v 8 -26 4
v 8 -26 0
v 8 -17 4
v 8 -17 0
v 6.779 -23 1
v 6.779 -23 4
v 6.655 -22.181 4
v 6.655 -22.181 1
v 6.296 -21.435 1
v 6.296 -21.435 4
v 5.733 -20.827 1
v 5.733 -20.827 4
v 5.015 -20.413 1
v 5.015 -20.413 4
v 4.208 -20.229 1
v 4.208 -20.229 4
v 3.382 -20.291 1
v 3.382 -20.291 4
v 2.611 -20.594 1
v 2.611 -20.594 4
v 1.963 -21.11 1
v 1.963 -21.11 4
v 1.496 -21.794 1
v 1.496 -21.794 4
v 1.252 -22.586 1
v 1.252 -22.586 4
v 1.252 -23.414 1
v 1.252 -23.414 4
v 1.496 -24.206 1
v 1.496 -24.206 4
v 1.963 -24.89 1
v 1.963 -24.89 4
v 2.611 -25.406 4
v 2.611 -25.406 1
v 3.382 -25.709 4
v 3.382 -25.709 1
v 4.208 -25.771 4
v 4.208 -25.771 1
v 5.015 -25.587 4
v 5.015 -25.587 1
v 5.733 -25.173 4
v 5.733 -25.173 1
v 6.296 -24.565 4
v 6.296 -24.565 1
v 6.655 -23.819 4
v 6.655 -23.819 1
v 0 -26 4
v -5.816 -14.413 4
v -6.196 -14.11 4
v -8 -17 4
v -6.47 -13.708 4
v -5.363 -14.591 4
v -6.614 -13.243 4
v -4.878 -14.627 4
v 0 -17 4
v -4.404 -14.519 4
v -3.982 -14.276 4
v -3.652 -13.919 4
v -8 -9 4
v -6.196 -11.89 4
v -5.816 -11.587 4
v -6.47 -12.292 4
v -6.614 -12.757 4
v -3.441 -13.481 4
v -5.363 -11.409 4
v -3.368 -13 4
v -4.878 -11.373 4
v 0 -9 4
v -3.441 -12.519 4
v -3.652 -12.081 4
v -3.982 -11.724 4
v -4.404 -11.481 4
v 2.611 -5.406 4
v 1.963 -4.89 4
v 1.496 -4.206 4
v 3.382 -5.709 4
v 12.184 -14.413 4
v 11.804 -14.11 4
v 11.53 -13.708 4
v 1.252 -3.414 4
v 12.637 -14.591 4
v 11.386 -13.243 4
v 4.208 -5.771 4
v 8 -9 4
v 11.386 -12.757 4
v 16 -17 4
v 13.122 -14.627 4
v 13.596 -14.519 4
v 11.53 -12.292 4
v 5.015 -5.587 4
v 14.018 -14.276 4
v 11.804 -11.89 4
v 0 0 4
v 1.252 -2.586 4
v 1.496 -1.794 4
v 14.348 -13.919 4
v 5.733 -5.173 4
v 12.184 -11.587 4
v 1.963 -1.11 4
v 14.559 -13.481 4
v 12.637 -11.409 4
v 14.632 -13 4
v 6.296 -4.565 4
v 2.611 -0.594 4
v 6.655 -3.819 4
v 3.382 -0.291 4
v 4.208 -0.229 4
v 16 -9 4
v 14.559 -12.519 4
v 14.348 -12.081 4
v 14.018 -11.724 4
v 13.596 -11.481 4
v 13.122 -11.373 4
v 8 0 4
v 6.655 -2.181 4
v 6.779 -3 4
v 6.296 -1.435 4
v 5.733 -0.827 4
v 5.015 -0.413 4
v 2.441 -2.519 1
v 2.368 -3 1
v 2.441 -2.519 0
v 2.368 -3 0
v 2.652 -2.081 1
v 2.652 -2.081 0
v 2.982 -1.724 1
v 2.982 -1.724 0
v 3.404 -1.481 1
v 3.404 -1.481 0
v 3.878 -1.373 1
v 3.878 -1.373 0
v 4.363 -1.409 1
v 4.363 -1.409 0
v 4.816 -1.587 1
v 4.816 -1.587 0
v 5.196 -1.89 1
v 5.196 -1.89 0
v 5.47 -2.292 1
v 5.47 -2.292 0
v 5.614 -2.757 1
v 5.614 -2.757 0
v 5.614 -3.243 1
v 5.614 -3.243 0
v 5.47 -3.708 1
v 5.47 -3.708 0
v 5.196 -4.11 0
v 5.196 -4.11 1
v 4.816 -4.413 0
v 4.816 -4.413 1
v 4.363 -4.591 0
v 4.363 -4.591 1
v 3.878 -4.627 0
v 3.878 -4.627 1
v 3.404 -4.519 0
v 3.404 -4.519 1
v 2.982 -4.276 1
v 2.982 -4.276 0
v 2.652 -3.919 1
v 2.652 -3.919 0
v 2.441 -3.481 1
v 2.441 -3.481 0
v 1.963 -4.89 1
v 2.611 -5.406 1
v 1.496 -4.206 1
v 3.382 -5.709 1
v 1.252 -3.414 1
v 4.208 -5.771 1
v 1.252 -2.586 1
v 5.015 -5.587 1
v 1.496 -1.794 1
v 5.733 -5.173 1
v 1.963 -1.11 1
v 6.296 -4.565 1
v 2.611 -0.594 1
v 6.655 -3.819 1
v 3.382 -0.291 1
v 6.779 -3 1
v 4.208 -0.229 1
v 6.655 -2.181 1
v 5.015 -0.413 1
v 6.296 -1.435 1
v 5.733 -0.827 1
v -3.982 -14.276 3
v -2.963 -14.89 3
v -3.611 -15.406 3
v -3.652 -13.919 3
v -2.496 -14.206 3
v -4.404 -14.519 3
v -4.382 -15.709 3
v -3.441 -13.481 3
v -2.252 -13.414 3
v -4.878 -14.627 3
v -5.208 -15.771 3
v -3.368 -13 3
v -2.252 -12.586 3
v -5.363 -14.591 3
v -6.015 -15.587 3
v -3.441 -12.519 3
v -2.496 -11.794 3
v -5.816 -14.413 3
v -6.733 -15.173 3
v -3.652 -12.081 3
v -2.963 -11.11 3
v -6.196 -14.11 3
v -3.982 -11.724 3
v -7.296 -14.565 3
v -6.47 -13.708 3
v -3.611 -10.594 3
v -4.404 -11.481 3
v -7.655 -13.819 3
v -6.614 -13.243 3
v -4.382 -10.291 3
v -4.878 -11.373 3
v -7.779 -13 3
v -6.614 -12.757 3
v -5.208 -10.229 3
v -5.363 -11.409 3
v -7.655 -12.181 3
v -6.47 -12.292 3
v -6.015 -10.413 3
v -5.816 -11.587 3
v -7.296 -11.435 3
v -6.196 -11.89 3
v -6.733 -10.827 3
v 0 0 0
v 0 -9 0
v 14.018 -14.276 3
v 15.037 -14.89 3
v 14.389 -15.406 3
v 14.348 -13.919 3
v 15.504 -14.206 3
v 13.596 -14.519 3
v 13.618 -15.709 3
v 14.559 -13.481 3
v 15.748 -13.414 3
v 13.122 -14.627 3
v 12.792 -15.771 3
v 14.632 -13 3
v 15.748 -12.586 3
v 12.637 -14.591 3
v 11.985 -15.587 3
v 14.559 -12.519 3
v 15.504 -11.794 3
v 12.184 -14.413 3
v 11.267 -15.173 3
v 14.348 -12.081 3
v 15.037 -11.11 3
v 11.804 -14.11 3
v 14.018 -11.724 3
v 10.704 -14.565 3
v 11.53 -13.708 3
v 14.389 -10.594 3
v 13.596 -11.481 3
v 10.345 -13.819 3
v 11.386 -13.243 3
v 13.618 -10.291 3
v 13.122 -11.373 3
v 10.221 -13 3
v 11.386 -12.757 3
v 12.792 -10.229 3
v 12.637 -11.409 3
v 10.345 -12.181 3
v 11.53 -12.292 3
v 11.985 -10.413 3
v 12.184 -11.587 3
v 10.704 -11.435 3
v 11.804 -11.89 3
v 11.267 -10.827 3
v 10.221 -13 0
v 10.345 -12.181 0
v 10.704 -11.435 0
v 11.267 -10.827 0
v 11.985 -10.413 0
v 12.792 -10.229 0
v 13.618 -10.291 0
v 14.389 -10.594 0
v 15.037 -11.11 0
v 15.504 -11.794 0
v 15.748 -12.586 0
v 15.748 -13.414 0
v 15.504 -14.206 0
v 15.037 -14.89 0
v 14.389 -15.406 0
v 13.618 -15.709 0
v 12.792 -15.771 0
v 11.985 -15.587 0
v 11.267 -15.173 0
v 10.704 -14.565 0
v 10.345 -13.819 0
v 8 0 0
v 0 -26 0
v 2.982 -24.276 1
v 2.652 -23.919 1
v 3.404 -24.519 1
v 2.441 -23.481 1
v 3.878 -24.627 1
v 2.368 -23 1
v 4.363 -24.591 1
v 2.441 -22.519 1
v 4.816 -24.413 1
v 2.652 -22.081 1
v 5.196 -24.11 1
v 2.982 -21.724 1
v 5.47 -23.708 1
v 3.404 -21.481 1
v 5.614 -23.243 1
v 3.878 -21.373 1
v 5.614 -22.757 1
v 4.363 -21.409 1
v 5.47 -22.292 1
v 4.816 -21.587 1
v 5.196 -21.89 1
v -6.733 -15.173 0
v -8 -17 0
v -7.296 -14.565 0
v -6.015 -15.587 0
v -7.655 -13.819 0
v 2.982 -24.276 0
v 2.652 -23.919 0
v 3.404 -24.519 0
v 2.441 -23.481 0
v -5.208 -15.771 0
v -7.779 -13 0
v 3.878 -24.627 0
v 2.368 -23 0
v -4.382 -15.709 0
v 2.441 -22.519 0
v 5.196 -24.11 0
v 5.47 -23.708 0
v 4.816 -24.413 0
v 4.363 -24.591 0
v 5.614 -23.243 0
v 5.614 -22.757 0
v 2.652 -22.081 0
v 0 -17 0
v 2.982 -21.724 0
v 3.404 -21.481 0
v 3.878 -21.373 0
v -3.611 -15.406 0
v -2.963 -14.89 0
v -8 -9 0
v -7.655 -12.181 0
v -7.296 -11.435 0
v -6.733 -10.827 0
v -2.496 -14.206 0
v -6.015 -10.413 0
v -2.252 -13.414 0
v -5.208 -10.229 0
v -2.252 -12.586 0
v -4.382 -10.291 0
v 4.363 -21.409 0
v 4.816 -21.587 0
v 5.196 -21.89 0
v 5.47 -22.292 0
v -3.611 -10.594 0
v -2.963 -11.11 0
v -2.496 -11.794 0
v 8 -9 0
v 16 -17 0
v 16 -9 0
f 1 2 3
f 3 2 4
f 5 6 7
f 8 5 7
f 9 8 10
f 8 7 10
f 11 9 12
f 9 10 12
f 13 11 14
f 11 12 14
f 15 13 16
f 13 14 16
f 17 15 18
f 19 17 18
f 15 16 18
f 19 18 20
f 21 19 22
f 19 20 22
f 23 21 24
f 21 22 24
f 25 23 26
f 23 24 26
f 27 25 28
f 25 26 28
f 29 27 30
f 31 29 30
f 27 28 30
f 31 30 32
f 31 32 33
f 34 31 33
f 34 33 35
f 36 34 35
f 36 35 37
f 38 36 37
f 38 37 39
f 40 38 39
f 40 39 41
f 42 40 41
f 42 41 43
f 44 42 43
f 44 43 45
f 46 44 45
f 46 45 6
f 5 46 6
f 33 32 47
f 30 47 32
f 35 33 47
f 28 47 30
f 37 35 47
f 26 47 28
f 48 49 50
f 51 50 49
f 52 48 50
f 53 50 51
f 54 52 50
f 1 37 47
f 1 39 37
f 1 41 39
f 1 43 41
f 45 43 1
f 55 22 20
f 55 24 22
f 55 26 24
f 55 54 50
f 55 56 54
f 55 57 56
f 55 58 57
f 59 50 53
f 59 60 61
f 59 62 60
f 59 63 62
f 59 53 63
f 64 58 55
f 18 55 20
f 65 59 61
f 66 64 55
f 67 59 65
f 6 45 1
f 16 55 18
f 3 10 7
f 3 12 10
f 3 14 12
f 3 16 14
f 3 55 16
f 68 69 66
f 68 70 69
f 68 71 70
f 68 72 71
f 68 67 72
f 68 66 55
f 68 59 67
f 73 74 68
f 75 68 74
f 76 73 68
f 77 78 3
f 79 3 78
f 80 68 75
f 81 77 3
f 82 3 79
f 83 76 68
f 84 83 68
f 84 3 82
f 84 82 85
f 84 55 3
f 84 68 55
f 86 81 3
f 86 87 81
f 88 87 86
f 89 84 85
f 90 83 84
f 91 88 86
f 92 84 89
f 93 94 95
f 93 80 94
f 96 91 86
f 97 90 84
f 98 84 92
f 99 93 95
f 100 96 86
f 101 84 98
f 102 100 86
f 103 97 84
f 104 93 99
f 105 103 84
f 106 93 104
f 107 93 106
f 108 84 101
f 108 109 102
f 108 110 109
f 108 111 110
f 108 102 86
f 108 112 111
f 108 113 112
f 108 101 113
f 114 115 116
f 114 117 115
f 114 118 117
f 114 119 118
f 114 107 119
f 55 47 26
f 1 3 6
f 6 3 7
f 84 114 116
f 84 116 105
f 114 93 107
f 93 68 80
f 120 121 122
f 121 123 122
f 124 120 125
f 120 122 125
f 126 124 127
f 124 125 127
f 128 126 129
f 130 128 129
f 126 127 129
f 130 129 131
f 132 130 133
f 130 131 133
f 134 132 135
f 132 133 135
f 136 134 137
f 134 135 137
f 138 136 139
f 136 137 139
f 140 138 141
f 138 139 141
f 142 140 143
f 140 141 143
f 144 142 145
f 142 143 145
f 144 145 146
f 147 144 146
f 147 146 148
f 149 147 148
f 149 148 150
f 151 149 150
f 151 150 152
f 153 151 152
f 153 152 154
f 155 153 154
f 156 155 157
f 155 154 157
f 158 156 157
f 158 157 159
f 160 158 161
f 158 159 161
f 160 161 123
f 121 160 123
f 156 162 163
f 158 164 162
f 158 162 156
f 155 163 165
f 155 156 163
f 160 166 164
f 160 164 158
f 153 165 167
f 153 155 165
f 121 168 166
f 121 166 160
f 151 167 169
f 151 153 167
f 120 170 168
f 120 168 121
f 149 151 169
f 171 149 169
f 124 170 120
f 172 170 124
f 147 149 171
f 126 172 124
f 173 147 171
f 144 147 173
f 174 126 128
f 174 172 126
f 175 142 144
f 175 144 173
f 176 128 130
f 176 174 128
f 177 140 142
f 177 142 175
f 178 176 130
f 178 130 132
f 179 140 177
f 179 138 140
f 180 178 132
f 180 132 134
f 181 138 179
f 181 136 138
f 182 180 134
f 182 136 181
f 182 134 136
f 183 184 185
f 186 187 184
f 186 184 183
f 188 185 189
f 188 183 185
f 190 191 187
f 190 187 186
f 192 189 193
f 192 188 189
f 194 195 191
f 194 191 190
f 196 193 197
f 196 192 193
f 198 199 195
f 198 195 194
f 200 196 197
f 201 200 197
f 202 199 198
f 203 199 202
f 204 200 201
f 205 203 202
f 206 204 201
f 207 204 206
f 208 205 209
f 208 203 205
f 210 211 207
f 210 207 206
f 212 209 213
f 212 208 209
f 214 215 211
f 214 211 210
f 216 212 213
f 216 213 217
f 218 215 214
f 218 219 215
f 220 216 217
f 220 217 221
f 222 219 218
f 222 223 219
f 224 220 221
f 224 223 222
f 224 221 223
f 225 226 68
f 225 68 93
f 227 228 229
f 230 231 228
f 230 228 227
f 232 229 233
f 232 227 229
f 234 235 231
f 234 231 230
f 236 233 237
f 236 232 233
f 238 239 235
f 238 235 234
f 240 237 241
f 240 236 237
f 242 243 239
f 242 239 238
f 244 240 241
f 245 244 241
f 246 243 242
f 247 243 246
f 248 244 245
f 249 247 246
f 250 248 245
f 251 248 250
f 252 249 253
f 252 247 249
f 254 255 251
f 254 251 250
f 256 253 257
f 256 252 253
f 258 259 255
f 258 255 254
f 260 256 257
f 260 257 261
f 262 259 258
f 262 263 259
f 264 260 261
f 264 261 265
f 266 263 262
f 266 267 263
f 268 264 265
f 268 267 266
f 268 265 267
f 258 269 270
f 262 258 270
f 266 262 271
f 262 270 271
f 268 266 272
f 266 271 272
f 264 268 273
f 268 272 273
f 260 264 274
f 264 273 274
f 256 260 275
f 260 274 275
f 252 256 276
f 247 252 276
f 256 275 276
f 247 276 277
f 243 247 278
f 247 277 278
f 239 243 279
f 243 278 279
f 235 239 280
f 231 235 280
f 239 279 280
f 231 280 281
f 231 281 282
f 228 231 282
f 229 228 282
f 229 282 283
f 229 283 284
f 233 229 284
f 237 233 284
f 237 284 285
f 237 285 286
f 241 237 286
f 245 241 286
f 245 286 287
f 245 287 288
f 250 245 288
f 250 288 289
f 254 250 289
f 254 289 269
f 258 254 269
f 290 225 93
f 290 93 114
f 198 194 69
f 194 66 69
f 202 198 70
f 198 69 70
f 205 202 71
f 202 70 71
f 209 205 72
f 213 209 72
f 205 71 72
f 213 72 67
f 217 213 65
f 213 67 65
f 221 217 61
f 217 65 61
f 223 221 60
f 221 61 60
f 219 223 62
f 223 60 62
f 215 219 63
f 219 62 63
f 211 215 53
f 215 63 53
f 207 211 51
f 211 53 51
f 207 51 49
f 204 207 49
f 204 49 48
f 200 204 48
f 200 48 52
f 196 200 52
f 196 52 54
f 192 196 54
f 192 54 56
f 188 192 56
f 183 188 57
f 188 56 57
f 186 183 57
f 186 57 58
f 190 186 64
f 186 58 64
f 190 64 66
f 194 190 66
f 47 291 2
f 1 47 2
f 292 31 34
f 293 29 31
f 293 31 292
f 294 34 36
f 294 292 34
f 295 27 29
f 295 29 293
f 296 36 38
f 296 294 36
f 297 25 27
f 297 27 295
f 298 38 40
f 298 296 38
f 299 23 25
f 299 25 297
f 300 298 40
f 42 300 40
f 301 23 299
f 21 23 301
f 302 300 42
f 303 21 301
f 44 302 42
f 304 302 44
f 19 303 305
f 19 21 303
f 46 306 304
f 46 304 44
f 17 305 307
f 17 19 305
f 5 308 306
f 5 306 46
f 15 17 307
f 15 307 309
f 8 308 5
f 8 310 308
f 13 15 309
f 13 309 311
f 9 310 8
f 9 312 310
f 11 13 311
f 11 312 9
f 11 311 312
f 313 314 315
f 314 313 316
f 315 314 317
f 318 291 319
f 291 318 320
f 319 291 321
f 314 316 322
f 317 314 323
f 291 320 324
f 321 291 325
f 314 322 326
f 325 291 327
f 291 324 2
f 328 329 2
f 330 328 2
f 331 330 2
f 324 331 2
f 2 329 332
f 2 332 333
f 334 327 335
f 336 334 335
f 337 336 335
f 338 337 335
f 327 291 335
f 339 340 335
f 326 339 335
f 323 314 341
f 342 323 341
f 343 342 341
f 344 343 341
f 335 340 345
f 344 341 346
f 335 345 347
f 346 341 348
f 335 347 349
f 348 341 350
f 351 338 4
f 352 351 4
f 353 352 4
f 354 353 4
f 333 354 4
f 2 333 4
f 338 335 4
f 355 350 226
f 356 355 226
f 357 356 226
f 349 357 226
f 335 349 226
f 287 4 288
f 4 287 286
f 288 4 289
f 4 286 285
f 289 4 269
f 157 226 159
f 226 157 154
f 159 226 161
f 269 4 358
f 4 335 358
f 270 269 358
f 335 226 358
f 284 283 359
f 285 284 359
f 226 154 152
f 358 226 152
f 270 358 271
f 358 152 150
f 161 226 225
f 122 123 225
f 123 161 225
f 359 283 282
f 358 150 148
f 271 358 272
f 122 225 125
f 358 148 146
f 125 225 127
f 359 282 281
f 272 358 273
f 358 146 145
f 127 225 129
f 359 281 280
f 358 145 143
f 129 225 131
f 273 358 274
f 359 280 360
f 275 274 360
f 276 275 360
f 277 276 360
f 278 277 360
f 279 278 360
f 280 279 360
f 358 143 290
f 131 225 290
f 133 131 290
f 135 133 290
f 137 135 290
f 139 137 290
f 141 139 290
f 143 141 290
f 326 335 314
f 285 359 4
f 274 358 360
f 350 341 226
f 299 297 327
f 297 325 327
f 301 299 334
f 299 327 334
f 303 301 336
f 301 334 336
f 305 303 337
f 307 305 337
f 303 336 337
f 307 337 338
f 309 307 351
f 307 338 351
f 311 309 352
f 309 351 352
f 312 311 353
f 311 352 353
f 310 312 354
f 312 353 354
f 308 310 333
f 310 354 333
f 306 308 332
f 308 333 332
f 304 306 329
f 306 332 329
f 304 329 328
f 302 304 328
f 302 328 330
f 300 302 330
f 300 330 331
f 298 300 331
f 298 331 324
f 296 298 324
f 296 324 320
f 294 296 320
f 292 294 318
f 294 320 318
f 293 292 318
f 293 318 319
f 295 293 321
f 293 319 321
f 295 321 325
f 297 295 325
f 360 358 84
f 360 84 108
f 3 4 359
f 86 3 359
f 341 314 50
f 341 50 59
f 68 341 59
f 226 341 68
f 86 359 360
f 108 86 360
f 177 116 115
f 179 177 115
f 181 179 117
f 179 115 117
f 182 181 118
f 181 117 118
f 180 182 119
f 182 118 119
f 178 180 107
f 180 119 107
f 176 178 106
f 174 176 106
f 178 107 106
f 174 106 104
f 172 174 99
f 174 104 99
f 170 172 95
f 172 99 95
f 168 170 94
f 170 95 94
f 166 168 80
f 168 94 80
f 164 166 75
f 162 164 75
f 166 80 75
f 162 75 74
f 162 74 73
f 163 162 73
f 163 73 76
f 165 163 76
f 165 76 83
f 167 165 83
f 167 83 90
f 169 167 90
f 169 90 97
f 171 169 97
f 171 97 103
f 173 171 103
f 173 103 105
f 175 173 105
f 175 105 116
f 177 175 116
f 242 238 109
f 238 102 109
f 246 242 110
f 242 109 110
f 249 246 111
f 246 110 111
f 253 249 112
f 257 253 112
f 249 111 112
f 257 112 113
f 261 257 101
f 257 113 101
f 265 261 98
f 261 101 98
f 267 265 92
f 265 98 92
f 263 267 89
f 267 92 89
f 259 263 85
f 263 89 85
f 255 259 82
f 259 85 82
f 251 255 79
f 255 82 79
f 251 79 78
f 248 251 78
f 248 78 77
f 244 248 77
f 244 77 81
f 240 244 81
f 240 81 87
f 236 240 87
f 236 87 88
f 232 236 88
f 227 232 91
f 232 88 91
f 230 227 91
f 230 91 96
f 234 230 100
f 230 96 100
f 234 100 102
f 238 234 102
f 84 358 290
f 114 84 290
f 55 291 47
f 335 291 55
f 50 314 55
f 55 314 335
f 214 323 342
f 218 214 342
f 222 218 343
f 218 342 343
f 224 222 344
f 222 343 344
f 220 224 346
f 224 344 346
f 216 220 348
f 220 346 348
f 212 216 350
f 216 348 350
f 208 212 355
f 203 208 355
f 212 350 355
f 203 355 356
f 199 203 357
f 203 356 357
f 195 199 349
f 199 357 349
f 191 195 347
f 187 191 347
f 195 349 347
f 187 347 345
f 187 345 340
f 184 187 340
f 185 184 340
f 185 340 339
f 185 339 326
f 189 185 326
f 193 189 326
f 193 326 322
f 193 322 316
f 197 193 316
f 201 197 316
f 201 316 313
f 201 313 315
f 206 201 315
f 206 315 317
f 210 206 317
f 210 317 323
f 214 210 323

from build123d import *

# Parameters (mm, degrees)
SKETCH3_W                                      = 8
SKETCH3_H                                      = 26
SKETCH3_R                                      = 1
SKETCH3_W_2                                    = 24
SKETCH3_H_2                                    = 8
BOSS_EXTRUDE1_DEPTH                            = 4
CBORE_FOR_4_SOCKET_HEAD_CAP_SCREW2_D           = 3.2639
CBORE_FOR_4_SOCKET_HEAD_CAP_SCREW2_CBORE_D     = 5.55752
CBORE_FOR_4_SOCKET_HEAD_CAP_SCREW2_CBORE_DEPTH = 3.000000096
CBORE_FOR_4_SOCKET_HEAD_CAP_SCREW3_D           = 3.2639
CBORE_FOR_4_SOCKET_HEAD_CAP_SCREW3_CBORE_D     = 5.55752
CBORE_FOR_4_SOCKET_HEAD_CAP_SCREW3_CBORE_DEPTH = 3.000000096


with BuildPart() as part:
    # Sketch3 → Boss-Extrude1 (new body)
    # profile 1 of 2: a face of its own
    with BuildSketch(Plane.XY):
        with Locations((4, -13)):
            Rectangle(SKETCH3_W, SKETCH3_H)
        with Locations((4, -3)):
            Circle(SKETCH3_R, mode=Mode.SUBTRACT)
        with Locations((4, -23)):
            Circle(SKETCH3_R, mode=Mode.SUBTRACT)
    # profile 2 of 2: a face of its own
    with BuildSketch(Plane.XY):
        with Locations((4, -13)):
            Rectangle(SKETCH3_W_2, SKETCH3_H_2)
        with Locations((-5, -13)):
            Circle(SKETCH3_R, mode=Mode.SUBTRACT)
        with Locations((13, -13)):
            Circle(SKETCH3_R, mode=Mode.SUBTRACT)
    extrude(amount=BOSS_EXTRUDE1_DEPTH)

    # CBORE for #4 Socket Head Cap Screw2 (through all)
    with Locations(Plane(origin=(4, -3, 4), x_dir=(1, 0, 0), z_dir=(0, 0, 1))):
        with Locations((0, 0), (0, -20)):
            CounterBoreHole(CBORE_FOR_4_SOCKET_HEAD_CAP_SCREW2_D / 2, CBORE_FOR_4_SOCKET_HEAD_CAP_SCREW2_CBORE_D / 2, CBORE_FOR_4_SOCKET_HEAD_CAP_SCREW2_CBORE_DEPTH)

    # CBORE for #4 Socket Head Cap Screw3 (through all)
    with Locations(Plane(origin=(13, -13, 0), x_dir=(-1, 0, 0), z_dir=(0, 0, -1))):
        with Locations((0, 0), (18, 0)):
            CounterBoreHole(CBORE_FOR_4_SOCKET_HEAD_CAP_SCREW3_D / 2, CBORE_FOR_4_SOCKET_HEAD_CAP_SCREW3_CBORE_D / 2, CBORE_FOR_4_SOCKET_HEAD_CAP_SCREW3_CBORE_DEPTH)


solid = part.part
